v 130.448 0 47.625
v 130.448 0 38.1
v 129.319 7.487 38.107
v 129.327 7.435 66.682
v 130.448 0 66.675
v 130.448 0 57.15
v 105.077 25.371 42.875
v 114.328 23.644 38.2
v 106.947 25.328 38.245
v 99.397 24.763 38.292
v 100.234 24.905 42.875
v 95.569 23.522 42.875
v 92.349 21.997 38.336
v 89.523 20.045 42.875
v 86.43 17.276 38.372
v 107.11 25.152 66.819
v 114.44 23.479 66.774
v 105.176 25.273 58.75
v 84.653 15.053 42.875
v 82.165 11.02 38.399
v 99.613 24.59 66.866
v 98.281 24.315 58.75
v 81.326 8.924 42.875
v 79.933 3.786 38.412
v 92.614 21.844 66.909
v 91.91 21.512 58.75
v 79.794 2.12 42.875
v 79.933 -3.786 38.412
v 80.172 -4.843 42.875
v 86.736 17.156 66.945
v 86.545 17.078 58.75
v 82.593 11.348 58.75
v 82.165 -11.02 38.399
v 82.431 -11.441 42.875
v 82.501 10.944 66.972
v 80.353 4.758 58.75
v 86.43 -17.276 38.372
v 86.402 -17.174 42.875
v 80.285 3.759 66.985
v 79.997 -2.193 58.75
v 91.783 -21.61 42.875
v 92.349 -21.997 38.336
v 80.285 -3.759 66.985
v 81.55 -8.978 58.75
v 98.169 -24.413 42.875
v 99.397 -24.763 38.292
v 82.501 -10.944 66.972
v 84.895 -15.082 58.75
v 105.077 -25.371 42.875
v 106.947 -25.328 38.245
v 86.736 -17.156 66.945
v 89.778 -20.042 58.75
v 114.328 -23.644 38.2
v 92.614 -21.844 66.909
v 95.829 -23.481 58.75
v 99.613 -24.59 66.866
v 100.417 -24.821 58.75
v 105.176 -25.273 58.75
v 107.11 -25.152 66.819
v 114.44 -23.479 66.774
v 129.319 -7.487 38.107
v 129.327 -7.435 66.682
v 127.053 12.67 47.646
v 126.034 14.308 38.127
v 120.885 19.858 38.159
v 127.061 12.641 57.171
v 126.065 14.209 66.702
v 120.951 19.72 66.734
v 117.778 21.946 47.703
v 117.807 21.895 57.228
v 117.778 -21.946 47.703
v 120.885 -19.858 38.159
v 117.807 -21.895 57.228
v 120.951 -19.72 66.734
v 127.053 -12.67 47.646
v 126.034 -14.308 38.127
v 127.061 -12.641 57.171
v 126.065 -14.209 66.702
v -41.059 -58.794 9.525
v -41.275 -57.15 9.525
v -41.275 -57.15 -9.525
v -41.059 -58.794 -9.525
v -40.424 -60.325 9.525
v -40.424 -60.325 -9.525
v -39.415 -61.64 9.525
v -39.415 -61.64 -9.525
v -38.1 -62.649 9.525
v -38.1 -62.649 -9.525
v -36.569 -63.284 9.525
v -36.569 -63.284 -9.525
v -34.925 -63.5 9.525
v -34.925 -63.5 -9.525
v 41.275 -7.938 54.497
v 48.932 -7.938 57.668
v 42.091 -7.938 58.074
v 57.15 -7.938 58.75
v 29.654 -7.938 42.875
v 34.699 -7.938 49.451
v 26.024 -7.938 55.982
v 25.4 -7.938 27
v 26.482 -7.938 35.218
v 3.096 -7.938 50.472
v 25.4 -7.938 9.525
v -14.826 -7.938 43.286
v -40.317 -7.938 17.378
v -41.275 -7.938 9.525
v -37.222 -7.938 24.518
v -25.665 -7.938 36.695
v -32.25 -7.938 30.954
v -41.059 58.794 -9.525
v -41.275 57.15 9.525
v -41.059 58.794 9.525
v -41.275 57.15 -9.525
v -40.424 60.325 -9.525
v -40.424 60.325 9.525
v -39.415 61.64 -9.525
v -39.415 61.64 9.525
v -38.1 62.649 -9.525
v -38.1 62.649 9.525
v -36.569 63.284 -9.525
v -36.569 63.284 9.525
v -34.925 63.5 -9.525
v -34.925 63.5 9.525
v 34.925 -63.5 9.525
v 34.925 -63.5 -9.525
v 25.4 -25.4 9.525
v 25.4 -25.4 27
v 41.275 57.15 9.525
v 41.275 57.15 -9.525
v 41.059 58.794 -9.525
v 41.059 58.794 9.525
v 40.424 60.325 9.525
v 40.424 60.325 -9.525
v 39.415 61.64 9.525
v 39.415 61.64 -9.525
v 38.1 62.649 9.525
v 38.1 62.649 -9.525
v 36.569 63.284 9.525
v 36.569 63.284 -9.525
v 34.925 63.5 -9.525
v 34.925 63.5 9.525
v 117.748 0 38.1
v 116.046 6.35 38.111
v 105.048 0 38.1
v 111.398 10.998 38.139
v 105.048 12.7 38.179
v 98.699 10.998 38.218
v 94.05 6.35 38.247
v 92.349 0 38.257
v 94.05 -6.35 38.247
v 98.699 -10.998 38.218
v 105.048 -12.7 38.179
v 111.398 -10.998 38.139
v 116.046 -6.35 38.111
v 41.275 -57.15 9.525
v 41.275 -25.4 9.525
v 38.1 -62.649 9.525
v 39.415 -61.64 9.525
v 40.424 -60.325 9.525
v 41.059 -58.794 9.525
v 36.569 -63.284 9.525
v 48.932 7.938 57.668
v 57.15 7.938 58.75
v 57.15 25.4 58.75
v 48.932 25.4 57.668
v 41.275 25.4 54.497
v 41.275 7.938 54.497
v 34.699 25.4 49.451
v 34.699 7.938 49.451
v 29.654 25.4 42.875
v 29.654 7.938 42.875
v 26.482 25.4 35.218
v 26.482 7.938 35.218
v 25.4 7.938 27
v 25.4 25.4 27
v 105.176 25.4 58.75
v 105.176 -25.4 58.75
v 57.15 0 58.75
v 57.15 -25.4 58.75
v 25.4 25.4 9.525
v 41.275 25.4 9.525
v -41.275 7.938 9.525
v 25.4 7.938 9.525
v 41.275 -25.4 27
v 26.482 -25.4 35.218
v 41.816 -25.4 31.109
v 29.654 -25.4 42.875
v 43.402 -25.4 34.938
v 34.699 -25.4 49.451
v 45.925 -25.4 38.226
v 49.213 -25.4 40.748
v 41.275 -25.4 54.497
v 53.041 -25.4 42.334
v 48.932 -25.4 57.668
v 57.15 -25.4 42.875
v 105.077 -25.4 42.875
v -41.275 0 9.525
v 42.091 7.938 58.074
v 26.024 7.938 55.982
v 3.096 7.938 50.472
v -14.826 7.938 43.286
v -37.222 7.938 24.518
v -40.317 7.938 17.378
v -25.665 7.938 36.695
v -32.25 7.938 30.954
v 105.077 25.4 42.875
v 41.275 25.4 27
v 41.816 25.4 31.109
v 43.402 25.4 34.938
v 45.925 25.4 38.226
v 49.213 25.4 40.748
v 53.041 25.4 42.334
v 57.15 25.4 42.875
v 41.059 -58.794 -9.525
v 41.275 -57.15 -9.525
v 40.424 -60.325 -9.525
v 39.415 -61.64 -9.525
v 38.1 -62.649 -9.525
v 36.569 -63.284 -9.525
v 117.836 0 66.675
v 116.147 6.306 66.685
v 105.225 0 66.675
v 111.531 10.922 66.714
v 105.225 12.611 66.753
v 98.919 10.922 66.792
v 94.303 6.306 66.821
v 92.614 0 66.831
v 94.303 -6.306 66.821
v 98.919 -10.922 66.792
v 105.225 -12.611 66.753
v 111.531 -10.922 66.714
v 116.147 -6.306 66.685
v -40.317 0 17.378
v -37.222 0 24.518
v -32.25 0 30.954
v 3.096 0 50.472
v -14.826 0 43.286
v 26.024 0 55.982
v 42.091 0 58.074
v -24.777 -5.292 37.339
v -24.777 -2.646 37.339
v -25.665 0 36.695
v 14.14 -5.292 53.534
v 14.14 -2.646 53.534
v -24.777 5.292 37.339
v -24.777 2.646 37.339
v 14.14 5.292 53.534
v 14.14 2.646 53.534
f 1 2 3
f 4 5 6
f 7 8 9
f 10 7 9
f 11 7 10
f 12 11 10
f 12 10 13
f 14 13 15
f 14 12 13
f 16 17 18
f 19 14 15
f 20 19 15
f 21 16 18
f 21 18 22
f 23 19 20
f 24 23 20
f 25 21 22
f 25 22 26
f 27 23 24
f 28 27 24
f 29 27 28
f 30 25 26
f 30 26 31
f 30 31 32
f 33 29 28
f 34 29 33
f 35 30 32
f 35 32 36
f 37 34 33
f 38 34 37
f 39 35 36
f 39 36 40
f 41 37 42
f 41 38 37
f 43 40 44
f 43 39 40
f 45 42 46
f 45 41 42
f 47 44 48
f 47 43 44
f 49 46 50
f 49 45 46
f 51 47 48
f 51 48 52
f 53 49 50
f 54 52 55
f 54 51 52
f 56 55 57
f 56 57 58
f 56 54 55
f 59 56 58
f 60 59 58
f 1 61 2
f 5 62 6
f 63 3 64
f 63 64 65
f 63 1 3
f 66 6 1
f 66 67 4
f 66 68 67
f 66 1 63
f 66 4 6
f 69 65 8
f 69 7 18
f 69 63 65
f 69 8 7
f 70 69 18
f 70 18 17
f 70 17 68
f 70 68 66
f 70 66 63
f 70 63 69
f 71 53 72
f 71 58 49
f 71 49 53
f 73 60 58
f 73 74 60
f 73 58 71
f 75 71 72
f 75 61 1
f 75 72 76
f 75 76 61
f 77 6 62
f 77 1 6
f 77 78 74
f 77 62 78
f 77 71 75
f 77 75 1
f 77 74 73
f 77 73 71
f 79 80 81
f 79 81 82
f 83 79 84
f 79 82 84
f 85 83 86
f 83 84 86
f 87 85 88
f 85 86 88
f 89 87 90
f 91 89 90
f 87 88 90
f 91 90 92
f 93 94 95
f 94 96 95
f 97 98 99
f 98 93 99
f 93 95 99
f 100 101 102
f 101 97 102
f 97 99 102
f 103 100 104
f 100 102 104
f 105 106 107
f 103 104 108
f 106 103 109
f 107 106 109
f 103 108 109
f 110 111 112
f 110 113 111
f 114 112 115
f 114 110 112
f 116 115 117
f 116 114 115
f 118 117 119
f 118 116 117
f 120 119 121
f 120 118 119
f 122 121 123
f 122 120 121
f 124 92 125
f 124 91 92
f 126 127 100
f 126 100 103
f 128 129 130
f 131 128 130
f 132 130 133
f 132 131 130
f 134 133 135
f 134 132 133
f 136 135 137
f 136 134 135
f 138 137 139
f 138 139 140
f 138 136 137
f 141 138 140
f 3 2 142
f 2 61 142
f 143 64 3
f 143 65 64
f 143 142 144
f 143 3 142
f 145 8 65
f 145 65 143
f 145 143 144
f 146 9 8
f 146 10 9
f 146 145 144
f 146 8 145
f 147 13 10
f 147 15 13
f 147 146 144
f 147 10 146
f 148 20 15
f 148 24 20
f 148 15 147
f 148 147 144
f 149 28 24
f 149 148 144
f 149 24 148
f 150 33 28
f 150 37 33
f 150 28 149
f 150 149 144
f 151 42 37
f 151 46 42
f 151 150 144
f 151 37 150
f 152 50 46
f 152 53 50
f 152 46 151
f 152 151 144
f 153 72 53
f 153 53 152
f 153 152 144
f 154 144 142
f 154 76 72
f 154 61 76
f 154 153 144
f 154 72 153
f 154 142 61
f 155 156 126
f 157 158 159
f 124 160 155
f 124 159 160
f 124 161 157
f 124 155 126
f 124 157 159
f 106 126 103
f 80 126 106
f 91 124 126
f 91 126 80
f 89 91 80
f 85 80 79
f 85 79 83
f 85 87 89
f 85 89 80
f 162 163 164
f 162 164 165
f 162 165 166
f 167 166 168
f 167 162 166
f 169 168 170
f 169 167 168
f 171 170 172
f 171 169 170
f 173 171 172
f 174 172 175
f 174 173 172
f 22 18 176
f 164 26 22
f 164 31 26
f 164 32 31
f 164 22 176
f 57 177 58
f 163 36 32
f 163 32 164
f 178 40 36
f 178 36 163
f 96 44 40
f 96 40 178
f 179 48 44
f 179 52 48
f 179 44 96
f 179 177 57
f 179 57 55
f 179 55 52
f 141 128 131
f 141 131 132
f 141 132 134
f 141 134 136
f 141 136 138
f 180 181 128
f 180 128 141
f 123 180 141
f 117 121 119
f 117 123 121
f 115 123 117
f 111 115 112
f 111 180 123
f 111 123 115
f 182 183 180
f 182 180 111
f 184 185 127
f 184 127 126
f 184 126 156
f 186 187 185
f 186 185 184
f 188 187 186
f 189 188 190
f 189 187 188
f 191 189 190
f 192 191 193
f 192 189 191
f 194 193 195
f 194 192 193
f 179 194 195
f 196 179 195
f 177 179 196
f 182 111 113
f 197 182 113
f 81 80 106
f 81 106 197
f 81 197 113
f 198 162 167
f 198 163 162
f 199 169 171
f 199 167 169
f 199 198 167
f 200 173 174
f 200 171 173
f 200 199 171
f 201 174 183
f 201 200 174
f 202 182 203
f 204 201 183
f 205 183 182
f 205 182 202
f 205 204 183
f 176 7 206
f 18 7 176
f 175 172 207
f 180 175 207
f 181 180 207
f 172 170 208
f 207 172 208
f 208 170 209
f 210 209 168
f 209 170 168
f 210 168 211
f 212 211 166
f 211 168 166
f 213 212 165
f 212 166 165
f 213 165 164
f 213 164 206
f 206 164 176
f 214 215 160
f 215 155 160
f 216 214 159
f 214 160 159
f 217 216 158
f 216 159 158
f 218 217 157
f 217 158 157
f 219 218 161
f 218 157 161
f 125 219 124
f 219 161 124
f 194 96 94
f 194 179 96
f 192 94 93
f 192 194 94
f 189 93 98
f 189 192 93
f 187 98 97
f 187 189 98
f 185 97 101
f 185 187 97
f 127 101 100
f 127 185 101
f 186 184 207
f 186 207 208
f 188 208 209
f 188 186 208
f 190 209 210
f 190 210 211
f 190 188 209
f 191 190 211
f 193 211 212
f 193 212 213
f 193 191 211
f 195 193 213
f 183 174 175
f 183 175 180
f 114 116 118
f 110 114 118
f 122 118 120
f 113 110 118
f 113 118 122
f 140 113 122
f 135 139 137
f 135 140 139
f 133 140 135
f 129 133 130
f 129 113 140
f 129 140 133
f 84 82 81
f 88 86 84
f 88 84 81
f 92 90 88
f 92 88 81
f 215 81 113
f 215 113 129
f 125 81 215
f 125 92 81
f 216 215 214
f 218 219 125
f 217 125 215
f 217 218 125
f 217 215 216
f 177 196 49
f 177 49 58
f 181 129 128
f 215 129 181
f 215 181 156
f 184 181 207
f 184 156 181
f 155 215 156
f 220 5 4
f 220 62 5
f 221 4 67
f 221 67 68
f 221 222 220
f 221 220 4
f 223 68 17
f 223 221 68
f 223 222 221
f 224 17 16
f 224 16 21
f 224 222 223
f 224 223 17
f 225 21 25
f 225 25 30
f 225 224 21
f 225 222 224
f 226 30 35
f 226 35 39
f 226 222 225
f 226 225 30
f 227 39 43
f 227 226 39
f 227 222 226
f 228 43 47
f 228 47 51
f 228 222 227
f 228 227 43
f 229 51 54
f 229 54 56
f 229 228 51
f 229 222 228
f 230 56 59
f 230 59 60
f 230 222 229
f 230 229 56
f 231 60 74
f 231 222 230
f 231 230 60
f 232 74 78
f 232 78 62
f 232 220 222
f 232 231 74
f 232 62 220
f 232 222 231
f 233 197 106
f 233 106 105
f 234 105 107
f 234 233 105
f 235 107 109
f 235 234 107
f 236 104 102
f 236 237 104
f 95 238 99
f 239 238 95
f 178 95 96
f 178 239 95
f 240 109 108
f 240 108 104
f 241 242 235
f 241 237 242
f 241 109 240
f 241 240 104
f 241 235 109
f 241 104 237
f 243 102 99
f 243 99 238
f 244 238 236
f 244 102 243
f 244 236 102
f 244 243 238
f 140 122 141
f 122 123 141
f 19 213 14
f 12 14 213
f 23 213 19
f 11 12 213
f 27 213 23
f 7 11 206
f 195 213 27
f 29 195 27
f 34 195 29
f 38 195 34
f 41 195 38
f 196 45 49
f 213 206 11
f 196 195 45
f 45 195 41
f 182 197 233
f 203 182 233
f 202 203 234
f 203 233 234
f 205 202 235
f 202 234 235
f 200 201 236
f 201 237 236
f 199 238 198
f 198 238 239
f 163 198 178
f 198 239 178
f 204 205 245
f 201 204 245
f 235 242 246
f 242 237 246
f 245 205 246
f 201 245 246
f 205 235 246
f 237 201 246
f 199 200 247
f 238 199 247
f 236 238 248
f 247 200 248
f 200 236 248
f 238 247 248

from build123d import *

# Parameters (mm, degrees)
F1_DEPTH = 63.5
F2_DEPTH = 25.4
F3_DEPTH = 7.9375
F4_DEPTH = 25.4
F6_R     = 6.35


with BuildPart() as f1:
    # F0 (on Front) → F1 (new body, symmetric)
    with BuildSketch(Plane.XZ):
        Polygon((-41.275, -9.525), (41.275, -9.525), (41.275, 9.525), (25.4, 9.525), (-41.275, 9.525), align=None)
    extrude(amount=F1_DEPTH, both=True)

    # F0 (on Front) → F2 (join, symmetric)
    with BuildSketch(Plane.XZ):
        with BuildLine():
            Line((25.4, 9.525), (41.275, 9.525))
            Line((41.275, 9.525), (41.275, 27.0002))
            ThreePointArc((41.275, 27.0002), (45.9246798487, 38.2255201513), (57.15, 42.8752))
            Line((57.15, 42.8752), (79.6478510928, 42.8752))
            Line((79.6478510928, 42.8752), (79.6478510928, 58.7502))
            Line((79.6478510928, 58.7502), (57.15, 58.7502))
            ThreePointArc((57.15, 58.7502), (34.6993596973, 49.4508403027), (25.4, 27.0002))
            Line((25.4, 27.0002), (25.4, 9.525))
        make_face()
    extrude(amount=F2_DEPTH, both=True)

    # F0 (on Front) → F3 (join, symmetric)
    with BuildSketch(Plane.XZ):
        with BuildLine():
            add(Edge.make_bspline(
                [(-41.275, 9.525), (-42.0931726694, 43.363686651), (18.200173974, 58.8082894683), (57.15, 58.7502)],
                knots=[0, 0, 0, 0, 110.0481755416, 110.0481755416, 110.0481755416, 110.0481755416], degree=3))
            Line((-41.275, 9.525), (25.4, 9.525))
            Line((25.4, 9.525), (25.4, 27.0002))
            ThreePointArc((25.4, 27.0002), (34.6993596973, 49.4508403027), (57.15, 58.7502))
        make_face()
    extrude(amount=F3_DEPTH, both=True)

    # F0 (on Front) → F4 (join, symmetric)
    with BuildSketch(Plane.XZ):
        Polygon((105.17556149, 58.7502), (79.6478510928, 58.7502), (79.6478510928, 42.8752), (105.0773831404, 42.8752), align=None)
    extrude(amount=F4_DEPTH, both=True)

    # F0 (on Front) → F5 (revolve)
    with BuildSketch(Plane.XZ):
        Polygon((105.2245721221, 66.675), (105.17556149, 58.7502), (105.0773831404, 42.8752), (105.0478510928, 38.1), (130.4478510928, 38.1), (130.4478510928, 66.675), align=None)
    revolve(axis=Axis((105.1362116075, 0, 52.3875), (0.0061843447, 0, 0.9999808768)))

    # F6
    f6_edges = [f1.edges().sort_by_distance(p)[0] for p in [
        (-41.275, -63.5, 0),
        (41.275, -63.5, 0),
        (41.275, 63.5, 0),
        (-41.275, 63.5, 0),
    ]]
    fillet(f6_edges, radius=F6_R)


solid = f1.part
